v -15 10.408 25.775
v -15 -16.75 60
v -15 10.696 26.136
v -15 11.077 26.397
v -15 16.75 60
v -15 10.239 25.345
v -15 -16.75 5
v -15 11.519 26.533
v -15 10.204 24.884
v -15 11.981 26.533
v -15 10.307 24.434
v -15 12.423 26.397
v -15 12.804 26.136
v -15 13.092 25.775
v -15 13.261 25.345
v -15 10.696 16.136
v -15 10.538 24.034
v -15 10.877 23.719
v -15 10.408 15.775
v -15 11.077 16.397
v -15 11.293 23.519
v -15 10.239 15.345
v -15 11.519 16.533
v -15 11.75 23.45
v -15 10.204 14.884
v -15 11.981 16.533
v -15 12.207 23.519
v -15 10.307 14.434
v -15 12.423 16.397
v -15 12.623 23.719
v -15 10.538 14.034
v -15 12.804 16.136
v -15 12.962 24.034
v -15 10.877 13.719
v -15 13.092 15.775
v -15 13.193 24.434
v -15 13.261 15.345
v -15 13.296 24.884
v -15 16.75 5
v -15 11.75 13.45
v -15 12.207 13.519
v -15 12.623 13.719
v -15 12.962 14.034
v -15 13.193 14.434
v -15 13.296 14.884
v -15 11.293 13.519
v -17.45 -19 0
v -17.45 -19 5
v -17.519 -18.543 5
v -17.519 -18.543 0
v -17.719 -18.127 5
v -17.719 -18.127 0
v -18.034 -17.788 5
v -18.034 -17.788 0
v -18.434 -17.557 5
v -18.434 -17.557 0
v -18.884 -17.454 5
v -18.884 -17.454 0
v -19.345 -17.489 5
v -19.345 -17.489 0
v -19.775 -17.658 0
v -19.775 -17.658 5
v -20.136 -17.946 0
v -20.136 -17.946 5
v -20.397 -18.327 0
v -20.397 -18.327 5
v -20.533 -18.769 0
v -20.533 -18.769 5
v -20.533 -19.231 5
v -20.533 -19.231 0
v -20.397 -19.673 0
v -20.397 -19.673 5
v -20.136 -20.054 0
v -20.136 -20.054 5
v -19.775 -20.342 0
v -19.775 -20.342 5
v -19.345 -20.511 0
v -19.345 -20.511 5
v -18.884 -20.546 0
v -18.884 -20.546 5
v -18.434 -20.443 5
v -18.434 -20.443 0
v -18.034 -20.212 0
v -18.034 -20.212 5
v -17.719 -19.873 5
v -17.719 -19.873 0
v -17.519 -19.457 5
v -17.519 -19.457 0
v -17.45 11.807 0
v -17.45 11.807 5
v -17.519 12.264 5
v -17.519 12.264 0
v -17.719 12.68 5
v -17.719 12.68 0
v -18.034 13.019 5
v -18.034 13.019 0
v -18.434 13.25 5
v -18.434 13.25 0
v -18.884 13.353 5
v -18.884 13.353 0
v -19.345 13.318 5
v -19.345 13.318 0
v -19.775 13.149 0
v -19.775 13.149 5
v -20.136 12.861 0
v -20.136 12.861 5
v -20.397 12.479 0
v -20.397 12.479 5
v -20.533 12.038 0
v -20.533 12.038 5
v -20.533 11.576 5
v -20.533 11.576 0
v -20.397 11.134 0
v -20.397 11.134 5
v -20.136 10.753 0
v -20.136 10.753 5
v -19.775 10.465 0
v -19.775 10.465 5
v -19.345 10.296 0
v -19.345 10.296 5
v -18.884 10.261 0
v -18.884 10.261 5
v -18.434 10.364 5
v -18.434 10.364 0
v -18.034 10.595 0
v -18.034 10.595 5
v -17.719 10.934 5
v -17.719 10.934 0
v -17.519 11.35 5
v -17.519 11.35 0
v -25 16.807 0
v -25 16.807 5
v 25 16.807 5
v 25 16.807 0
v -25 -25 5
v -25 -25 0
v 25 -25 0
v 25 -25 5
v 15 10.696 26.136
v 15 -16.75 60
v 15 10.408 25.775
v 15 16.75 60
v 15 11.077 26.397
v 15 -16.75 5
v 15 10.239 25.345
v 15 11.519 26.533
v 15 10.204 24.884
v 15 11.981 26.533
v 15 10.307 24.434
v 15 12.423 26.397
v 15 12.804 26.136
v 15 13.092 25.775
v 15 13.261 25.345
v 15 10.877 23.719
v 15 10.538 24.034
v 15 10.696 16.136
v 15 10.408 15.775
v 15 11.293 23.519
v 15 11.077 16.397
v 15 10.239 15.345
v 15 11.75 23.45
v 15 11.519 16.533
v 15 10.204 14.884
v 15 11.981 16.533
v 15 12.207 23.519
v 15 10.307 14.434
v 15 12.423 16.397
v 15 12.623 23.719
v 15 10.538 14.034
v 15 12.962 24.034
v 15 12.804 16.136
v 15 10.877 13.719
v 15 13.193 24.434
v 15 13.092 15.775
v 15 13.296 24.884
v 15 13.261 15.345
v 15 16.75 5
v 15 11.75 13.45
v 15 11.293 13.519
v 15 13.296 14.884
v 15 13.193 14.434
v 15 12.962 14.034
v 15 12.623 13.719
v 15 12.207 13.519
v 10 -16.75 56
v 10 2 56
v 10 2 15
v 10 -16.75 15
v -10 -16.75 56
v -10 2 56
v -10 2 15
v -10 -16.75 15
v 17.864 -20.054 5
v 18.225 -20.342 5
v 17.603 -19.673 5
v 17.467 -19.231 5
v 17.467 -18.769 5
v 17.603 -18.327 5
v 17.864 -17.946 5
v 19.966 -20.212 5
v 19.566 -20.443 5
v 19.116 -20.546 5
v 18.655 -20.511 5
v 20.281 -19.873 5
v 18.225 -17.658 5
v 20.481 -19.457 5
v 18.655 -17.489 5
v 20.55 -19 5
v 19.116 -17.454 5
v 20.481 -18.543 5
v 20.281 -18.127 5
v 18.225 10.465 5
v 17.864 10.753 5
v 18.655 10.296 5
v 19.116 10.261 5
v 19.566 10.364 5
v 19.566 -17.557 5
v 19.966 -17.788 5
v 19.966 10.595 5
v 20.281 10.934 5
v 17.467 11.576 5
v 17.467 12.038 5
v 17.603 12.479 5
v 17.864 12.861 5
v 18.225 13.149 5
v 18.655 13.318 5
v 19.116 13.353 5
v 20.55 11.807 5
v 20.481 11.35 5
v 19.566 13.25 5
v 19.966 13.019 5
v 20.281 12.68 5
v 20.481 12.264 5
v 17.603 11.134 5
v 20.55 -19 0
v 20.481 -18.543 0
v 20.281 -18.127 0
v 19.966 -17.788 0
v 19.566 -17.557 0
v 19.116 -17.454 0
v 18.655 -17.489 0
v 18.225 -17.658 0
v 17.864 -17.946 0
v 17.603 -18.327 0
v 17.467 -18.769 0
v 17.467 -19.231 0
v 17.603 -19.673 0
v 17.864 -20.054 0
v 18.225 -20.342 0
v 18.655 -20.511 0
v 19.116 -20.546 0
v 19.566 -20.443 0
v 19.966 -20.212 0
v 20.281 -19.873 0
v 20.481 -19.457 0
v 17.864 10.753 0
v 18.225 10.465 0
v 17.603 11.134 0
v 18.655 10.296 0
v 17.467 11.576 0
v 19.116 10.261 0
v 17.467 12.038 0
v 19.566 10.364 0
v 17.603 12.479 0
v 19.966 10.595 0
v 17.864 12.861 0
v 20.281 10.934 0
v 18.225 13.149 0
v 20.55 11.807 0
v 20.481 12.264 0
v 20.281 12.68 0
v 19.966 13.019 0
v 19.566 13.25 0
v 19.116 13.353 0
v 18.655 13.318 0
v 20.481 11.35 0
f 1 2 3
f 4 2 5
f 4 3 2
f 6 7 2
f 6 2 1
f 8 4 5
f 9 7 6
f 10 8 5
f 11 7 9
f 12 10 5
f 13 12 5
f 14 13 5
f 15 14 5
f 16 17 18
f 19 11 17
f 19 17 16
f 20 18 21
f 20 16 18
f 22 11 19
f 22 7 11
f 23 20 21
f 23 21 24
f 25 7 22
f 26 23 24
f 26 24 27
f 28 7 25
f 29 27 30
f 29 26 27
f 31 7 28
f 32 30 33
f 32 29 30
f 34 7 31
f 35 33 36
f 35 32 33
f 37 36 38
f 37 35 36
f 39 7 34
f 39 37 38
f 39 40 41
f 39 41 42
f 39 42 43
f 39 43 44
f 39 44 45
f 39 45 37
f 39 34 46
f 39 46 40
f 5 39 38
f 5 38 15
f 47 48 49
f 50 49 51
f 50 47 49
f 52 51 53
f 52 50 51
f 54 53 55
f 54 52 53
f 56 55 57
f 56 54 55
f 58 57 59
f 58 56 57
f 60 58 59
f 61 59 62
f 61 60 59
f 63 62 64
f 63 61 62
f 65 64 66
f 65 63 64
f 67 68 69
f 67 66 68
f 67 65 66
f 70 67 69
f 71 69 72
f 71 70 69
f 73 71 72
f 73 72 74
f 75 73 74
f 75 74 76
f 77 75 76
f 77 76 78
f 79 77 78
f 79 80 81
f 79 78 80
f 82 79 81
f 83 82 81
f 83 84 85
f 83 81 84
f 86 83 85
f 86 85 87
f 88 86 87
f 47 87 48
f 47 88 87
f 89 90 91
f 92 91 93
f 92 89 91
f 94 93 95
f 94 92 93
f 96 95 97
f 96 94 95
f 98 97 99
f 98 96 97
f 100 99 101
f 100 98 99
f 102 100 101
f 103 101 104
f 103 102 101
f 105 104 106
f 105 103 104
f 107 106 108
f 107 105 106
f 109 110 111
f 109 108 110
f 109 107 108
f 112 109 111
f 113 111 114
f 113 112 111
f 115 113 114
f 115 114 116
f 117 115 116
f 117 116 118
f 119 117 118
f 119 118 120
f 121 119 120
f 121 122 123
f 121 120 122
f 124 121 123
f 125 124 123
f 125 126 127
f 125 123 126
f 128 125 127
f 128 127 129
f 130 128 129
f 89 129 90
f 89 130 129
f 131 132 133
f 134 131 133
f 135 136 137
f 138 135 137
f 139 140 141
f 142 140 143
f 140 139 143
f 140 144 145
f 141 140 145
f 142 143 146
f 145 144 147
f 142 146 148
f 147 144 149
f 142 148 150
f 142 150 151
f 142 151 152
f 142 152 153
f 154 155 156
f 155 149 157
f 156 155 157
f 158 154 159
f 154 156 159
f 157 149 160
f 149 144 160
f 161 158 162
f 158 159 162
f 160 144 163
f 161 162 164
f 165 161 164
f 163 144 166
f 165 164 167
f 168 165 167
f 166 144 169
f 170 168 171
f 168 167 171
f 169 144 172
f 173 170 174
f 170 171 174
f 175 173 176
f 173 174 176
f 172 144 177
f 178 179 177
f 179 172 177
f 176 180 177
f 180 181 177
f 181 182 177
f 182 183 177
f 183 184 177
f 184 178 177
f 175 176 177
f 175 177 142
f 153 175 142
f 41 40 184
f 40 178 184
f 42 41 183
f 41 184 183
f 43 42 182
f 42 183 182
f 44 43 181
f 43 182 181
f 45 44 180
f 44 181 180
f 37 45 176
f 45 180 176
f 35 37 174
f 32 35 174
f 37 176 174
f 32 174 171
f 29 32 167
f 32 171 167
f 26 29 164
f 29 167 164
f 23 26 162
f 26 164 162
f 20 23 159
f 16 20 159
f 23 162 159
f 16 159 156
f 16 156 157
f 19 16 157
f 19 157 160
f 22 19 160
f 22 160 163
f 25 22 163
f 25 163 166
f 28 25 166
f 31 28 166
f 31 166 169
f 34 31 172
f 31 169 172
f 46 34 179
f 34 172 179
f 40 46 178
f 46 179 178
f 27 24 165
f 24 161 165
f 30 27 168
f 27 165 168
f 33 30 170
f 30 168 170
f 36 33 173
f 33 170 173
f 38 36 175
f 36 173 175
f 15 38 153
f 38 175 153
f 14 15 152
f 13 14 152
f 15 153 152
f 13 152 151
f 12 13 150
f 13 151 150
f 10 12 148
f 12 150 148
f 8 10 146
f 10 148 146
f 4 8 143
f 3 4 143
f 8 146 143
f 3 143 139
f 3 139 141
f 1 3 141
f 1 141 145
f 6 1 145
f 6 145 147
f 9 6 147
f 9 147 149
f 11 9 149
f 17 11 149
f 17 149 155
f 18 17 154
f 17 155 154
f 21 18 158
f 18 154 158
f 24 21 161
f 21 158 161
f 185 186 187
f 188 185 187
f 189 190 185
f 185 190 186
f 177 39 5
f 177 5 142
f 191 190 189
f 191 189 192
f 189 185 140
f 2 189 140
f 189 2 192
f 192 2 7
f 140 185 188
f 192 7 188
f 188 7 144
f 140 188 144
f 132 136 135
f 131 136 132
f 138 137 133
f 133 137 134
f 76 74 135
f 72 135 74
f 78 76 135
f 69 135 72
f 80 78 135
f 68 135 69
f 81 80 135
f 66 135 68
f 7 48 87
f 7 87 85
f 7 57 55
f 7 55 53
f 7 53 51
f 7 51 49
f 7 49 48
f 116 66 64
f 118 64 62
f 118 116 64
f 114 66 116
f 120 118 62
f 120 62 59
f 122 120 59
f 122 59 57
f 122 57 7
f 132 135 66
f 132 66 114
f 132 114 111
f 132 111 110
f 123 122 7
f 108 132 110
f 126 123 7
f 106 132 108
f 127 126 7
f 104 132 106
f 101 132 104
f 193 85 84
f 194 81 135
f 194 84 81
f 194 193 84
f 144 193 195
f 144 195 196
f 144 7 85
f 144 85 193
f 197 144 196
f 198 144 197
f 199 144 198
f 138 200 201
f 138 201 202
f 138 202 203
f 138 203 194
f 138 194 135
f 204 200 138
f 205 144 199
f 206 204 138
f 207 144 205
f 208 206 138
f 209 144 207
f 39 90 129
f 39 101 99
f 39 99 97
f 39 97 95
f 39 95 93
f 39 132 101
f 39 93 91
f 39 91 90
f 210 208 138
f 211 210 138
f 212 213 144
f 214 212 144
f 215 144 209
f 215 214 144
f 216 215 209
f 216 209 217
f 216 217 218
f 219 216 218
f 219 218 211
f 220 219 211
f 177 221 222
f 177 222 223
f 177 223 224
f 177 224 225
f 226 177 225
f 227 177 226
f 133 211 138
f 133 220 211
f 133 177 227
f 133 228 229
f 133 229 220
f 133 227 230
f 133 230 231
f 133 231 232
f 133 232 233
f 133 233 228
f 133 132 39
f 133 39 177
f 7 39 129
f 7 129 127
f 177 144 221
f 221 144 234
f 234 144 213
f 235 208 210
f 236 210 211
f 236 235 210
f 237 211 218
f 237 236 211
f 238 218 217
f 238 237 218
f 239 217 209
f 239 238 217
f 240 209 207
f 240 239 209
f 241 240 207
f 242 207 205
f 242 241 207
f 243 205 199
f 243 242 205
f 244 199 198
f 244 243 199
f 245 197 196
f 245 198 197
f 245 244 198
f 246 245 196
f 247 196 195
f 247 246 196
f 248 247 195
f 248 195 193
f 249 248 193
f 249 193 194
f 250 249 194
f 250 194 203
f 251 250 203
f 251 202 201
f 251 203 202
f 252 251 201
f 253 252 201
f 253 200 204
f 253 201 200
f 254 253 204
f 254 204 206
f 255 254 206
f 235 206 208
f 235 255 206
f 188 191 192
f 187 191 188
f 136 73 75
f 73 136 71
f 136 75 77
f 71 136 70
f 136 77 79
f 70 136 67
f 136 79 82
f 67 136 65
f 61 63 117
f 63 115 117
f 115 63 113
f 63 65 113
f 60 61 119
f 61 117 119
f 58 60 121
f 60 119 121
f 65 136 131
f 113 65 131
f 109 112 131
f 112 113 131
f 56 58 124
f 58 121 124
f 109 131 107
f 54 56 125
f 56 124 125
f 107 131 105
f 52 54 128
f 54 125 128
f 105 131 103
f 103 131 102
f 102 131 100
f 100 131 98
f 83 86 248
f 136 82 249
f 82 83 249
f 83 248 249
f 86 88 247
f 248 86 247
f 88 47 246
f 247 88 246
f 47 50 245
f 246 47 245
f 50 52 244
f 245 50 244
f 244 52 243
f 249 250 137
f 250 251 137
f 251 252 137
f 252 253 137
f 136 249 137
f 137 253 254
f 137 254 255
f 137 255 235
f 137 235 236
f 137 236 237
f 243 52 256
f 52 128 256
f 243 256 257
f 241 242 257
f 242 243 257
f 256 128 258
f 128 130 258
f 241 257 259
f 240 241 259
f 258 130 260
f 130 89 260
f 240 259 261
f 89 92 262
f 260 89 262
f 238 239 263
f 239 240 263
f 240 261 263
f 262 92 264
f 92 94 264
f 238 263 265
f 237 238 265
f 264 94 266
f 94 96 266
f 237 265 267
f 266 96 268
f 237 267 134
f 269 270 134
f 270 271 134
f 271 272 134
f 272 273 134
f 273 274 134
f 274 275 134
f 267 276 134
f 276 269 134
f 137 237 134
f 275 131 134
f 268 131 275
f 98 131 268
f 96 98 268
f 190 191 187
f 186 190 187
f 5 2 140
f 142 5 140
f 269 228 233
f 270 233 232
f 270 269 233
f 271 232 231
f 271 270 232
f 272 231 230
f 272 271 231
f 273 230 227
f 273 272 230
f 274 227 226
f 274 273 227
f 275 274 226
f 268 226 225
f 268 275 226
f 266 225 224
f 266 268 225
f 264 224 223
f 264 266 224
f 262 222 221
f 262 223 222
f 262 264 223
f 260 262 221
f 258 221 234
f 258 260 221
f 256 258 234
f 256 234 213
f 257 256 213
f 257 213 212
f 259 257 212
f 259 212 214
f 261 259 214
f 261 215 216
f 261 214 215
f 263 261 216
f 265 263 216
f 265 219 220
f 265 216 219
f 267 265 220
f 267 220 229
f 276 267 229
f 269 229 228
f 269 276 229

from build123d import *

# Parameters (mm, degrees)
SKETCH3_W               = 50
SKETCH3_H               = 50
BOSS_EXTRUDE1_DEPTH     = 5
BOSS_EXTRUDE4_START     = 5
SKETCH4_W               = 30
SKETCH4_H               = 33.5
BOSS_EXTRUDE4_DEPTH     = 70
CUT_EXTRUDE1_START      = 2
SKETCH6_W               = 20
SKETCH6_H               = 41
CUT_EXTRUDE1_DEPTH      = 19
SKETCH7_W               = 30
SKETCH7_H               = 15
CUT_EXTRUDE2_DEPTH      = 26
CUT_EXTRUDE2_DEPTH_BACK = 26
SKETCH9_R               = 1.55
CUT_EXTRUDE4_DEPTH      = 26
CUT_EXTRUDE4_DEPTH_BACK = 26
SKETCH10_R              = 1.55
CUT_EXTRUDE6_DEPTH      = 61
CUT_EXTRUDE6_DEPTH_BACK = 1
SKETCH11_W              = 50
SKETCH11_H              = 8.193147868
CUT_EXTRUDE7_DEPTH      = 25
SKETCH12_R              = 1.55
CUT_EXTRUDE8_DEPTH      = 61
CUT_EXTRUDE8_DEPTH_BACK = 25


with BuildPart() as part:
    # Sketch3 → Boss-Extrude1 (new body)
    with BuildSketch(Plane.XY):
        Rectangle(SKETCH3_W, SKETCH3_H)
    extrude(amount=BOSS_EXTRUDE1_DEPTH)

    # Sketch4 → Boss-Extrude4 (add)
    with BuildSketch(Plane.XY.offset(BOSS_EXTRUDE4_START)):
        Rectangle(SKETCH4_W, SKETCH4_H)
    extrude(amount=BOSS_EXTRUDE4_DEPTH)

    # Sketch6 → Cut-Extrude1 (cut)
    with BuildSketch(Plane(origin=(0, 0, 0), x_dir=(1, 0, 0), z_dir=(0, 1, 0)).offset(CUT_EXTRUDE1_START)):
        with Locations((0, -35.5)):
            Rectangle(SKETCH6_W, SKETCH6_H)
    extrude(amount=-CUT_EXTRUDE1_DEPTH, mode=Mode.SUBTRACT)

    # Sketch7 → Cut-Extrude2 (cut, two sides)
    with BuildSketch(Plane(origin=(0, 0, 0), x_dir=(1, 0, 0), z_dir=(0, 1, 0))) as cut_extrude2_sk:
        with Locations((0, -67.5)):
            Rectangle(SKETCH7_W, SKETCH7_H)
    extrude(amount=CUT_EXTRUDE2_DEPTH, mode=Mode.SUBTRACT)
    extrude(cut_extrude2_sk.sketch, amount=-CUT_EXTRUDE2_DEPTH_BACK, mode=Mode.SUBTRACT)

    # Sketch9 → Cut-Extrude4 (cut, two sides)
    with BuildSketch(Plane(origin=(0, 0, 0), x_dir=(0, 0, -1), z_dir=(1, 0, 0))) as cut_extrude4_sk:
        with Locations((-25, 11.75)):
            Circle(SKETCH9_R)
        with Locations((-15, 11.75)):
            Circle(SKETCH9_R)
    extrude(amount=CUT_EXTRUDE4_DEPTH, mode=Mode.SUBTRACT)
    extrude(cut_extrude4_sk.sketch, amount=-CUT_EXTRUDE4_DEPTH_BACK, mode=Mode.SUBTRACT)

    # Sketch10 → Cut-Extrude6 (cut, two sides)
    with BuildSketch(Plane.XY) as cut_extrude6_sk:
        with BuildLine():
            Line((-20.096015511, 20.096015511), (-17.903984489, 17.903984489))
            ThreePointArc((-17.903984489, 17.903984489), (-17.903984489, 20.096015511), (-20.096015511, 20.096015511))
        make_face()
        with Locations((19, 19)):
            Circle(SKETCH10_R)
        with Locations((19, -19)):
            Circle(SKETCH10_R)
        with Locations((-19, -19)):
            Circle(SKETCH10_R)
    extrude(amount=CUT_EXTRUDE6_DEPTH, mode=Mode.SUBTRACT)
    extrude(cut_extrude6_sk.sketch, amount=-CUT_EXTRUDE6_DEPTH_BACK, mode=Mode.SUBTRACT)

    # Sketch11 → Cut-Extrude7 (cut)
    with BuildSketch(Plane.XY.offset(5)):
        with Locations((0, 20.903426066)):
            Rectangle(SKETCH11_W, SKETCH11_H)
    extrude(amount=-CUT_EXTRUDE7_DEPTH, mode=Mode.SUBTRACT)

    # Sketch12 → Cut-Extrude8 (cut, two sides)
    with BuildSketch(Plane.XY) as cut_extrude8_sk:
        with Locations((-19, 11.806852132)):
            Circle(SKETCH12_R)
        with Locations((19, 11.806852132)):
            Circle(SKETCH12_R)
    extrude(amount=CUT_EXTRUDE8_DEPTH, mode=Mode.SUBTRACT)
    extrude(cut_extrude8_sk.sketch, amount=-CUT_EXTRUDE8_DEPTH_BACK, mode=Mode.SUBTRACT)


solid = part.part
